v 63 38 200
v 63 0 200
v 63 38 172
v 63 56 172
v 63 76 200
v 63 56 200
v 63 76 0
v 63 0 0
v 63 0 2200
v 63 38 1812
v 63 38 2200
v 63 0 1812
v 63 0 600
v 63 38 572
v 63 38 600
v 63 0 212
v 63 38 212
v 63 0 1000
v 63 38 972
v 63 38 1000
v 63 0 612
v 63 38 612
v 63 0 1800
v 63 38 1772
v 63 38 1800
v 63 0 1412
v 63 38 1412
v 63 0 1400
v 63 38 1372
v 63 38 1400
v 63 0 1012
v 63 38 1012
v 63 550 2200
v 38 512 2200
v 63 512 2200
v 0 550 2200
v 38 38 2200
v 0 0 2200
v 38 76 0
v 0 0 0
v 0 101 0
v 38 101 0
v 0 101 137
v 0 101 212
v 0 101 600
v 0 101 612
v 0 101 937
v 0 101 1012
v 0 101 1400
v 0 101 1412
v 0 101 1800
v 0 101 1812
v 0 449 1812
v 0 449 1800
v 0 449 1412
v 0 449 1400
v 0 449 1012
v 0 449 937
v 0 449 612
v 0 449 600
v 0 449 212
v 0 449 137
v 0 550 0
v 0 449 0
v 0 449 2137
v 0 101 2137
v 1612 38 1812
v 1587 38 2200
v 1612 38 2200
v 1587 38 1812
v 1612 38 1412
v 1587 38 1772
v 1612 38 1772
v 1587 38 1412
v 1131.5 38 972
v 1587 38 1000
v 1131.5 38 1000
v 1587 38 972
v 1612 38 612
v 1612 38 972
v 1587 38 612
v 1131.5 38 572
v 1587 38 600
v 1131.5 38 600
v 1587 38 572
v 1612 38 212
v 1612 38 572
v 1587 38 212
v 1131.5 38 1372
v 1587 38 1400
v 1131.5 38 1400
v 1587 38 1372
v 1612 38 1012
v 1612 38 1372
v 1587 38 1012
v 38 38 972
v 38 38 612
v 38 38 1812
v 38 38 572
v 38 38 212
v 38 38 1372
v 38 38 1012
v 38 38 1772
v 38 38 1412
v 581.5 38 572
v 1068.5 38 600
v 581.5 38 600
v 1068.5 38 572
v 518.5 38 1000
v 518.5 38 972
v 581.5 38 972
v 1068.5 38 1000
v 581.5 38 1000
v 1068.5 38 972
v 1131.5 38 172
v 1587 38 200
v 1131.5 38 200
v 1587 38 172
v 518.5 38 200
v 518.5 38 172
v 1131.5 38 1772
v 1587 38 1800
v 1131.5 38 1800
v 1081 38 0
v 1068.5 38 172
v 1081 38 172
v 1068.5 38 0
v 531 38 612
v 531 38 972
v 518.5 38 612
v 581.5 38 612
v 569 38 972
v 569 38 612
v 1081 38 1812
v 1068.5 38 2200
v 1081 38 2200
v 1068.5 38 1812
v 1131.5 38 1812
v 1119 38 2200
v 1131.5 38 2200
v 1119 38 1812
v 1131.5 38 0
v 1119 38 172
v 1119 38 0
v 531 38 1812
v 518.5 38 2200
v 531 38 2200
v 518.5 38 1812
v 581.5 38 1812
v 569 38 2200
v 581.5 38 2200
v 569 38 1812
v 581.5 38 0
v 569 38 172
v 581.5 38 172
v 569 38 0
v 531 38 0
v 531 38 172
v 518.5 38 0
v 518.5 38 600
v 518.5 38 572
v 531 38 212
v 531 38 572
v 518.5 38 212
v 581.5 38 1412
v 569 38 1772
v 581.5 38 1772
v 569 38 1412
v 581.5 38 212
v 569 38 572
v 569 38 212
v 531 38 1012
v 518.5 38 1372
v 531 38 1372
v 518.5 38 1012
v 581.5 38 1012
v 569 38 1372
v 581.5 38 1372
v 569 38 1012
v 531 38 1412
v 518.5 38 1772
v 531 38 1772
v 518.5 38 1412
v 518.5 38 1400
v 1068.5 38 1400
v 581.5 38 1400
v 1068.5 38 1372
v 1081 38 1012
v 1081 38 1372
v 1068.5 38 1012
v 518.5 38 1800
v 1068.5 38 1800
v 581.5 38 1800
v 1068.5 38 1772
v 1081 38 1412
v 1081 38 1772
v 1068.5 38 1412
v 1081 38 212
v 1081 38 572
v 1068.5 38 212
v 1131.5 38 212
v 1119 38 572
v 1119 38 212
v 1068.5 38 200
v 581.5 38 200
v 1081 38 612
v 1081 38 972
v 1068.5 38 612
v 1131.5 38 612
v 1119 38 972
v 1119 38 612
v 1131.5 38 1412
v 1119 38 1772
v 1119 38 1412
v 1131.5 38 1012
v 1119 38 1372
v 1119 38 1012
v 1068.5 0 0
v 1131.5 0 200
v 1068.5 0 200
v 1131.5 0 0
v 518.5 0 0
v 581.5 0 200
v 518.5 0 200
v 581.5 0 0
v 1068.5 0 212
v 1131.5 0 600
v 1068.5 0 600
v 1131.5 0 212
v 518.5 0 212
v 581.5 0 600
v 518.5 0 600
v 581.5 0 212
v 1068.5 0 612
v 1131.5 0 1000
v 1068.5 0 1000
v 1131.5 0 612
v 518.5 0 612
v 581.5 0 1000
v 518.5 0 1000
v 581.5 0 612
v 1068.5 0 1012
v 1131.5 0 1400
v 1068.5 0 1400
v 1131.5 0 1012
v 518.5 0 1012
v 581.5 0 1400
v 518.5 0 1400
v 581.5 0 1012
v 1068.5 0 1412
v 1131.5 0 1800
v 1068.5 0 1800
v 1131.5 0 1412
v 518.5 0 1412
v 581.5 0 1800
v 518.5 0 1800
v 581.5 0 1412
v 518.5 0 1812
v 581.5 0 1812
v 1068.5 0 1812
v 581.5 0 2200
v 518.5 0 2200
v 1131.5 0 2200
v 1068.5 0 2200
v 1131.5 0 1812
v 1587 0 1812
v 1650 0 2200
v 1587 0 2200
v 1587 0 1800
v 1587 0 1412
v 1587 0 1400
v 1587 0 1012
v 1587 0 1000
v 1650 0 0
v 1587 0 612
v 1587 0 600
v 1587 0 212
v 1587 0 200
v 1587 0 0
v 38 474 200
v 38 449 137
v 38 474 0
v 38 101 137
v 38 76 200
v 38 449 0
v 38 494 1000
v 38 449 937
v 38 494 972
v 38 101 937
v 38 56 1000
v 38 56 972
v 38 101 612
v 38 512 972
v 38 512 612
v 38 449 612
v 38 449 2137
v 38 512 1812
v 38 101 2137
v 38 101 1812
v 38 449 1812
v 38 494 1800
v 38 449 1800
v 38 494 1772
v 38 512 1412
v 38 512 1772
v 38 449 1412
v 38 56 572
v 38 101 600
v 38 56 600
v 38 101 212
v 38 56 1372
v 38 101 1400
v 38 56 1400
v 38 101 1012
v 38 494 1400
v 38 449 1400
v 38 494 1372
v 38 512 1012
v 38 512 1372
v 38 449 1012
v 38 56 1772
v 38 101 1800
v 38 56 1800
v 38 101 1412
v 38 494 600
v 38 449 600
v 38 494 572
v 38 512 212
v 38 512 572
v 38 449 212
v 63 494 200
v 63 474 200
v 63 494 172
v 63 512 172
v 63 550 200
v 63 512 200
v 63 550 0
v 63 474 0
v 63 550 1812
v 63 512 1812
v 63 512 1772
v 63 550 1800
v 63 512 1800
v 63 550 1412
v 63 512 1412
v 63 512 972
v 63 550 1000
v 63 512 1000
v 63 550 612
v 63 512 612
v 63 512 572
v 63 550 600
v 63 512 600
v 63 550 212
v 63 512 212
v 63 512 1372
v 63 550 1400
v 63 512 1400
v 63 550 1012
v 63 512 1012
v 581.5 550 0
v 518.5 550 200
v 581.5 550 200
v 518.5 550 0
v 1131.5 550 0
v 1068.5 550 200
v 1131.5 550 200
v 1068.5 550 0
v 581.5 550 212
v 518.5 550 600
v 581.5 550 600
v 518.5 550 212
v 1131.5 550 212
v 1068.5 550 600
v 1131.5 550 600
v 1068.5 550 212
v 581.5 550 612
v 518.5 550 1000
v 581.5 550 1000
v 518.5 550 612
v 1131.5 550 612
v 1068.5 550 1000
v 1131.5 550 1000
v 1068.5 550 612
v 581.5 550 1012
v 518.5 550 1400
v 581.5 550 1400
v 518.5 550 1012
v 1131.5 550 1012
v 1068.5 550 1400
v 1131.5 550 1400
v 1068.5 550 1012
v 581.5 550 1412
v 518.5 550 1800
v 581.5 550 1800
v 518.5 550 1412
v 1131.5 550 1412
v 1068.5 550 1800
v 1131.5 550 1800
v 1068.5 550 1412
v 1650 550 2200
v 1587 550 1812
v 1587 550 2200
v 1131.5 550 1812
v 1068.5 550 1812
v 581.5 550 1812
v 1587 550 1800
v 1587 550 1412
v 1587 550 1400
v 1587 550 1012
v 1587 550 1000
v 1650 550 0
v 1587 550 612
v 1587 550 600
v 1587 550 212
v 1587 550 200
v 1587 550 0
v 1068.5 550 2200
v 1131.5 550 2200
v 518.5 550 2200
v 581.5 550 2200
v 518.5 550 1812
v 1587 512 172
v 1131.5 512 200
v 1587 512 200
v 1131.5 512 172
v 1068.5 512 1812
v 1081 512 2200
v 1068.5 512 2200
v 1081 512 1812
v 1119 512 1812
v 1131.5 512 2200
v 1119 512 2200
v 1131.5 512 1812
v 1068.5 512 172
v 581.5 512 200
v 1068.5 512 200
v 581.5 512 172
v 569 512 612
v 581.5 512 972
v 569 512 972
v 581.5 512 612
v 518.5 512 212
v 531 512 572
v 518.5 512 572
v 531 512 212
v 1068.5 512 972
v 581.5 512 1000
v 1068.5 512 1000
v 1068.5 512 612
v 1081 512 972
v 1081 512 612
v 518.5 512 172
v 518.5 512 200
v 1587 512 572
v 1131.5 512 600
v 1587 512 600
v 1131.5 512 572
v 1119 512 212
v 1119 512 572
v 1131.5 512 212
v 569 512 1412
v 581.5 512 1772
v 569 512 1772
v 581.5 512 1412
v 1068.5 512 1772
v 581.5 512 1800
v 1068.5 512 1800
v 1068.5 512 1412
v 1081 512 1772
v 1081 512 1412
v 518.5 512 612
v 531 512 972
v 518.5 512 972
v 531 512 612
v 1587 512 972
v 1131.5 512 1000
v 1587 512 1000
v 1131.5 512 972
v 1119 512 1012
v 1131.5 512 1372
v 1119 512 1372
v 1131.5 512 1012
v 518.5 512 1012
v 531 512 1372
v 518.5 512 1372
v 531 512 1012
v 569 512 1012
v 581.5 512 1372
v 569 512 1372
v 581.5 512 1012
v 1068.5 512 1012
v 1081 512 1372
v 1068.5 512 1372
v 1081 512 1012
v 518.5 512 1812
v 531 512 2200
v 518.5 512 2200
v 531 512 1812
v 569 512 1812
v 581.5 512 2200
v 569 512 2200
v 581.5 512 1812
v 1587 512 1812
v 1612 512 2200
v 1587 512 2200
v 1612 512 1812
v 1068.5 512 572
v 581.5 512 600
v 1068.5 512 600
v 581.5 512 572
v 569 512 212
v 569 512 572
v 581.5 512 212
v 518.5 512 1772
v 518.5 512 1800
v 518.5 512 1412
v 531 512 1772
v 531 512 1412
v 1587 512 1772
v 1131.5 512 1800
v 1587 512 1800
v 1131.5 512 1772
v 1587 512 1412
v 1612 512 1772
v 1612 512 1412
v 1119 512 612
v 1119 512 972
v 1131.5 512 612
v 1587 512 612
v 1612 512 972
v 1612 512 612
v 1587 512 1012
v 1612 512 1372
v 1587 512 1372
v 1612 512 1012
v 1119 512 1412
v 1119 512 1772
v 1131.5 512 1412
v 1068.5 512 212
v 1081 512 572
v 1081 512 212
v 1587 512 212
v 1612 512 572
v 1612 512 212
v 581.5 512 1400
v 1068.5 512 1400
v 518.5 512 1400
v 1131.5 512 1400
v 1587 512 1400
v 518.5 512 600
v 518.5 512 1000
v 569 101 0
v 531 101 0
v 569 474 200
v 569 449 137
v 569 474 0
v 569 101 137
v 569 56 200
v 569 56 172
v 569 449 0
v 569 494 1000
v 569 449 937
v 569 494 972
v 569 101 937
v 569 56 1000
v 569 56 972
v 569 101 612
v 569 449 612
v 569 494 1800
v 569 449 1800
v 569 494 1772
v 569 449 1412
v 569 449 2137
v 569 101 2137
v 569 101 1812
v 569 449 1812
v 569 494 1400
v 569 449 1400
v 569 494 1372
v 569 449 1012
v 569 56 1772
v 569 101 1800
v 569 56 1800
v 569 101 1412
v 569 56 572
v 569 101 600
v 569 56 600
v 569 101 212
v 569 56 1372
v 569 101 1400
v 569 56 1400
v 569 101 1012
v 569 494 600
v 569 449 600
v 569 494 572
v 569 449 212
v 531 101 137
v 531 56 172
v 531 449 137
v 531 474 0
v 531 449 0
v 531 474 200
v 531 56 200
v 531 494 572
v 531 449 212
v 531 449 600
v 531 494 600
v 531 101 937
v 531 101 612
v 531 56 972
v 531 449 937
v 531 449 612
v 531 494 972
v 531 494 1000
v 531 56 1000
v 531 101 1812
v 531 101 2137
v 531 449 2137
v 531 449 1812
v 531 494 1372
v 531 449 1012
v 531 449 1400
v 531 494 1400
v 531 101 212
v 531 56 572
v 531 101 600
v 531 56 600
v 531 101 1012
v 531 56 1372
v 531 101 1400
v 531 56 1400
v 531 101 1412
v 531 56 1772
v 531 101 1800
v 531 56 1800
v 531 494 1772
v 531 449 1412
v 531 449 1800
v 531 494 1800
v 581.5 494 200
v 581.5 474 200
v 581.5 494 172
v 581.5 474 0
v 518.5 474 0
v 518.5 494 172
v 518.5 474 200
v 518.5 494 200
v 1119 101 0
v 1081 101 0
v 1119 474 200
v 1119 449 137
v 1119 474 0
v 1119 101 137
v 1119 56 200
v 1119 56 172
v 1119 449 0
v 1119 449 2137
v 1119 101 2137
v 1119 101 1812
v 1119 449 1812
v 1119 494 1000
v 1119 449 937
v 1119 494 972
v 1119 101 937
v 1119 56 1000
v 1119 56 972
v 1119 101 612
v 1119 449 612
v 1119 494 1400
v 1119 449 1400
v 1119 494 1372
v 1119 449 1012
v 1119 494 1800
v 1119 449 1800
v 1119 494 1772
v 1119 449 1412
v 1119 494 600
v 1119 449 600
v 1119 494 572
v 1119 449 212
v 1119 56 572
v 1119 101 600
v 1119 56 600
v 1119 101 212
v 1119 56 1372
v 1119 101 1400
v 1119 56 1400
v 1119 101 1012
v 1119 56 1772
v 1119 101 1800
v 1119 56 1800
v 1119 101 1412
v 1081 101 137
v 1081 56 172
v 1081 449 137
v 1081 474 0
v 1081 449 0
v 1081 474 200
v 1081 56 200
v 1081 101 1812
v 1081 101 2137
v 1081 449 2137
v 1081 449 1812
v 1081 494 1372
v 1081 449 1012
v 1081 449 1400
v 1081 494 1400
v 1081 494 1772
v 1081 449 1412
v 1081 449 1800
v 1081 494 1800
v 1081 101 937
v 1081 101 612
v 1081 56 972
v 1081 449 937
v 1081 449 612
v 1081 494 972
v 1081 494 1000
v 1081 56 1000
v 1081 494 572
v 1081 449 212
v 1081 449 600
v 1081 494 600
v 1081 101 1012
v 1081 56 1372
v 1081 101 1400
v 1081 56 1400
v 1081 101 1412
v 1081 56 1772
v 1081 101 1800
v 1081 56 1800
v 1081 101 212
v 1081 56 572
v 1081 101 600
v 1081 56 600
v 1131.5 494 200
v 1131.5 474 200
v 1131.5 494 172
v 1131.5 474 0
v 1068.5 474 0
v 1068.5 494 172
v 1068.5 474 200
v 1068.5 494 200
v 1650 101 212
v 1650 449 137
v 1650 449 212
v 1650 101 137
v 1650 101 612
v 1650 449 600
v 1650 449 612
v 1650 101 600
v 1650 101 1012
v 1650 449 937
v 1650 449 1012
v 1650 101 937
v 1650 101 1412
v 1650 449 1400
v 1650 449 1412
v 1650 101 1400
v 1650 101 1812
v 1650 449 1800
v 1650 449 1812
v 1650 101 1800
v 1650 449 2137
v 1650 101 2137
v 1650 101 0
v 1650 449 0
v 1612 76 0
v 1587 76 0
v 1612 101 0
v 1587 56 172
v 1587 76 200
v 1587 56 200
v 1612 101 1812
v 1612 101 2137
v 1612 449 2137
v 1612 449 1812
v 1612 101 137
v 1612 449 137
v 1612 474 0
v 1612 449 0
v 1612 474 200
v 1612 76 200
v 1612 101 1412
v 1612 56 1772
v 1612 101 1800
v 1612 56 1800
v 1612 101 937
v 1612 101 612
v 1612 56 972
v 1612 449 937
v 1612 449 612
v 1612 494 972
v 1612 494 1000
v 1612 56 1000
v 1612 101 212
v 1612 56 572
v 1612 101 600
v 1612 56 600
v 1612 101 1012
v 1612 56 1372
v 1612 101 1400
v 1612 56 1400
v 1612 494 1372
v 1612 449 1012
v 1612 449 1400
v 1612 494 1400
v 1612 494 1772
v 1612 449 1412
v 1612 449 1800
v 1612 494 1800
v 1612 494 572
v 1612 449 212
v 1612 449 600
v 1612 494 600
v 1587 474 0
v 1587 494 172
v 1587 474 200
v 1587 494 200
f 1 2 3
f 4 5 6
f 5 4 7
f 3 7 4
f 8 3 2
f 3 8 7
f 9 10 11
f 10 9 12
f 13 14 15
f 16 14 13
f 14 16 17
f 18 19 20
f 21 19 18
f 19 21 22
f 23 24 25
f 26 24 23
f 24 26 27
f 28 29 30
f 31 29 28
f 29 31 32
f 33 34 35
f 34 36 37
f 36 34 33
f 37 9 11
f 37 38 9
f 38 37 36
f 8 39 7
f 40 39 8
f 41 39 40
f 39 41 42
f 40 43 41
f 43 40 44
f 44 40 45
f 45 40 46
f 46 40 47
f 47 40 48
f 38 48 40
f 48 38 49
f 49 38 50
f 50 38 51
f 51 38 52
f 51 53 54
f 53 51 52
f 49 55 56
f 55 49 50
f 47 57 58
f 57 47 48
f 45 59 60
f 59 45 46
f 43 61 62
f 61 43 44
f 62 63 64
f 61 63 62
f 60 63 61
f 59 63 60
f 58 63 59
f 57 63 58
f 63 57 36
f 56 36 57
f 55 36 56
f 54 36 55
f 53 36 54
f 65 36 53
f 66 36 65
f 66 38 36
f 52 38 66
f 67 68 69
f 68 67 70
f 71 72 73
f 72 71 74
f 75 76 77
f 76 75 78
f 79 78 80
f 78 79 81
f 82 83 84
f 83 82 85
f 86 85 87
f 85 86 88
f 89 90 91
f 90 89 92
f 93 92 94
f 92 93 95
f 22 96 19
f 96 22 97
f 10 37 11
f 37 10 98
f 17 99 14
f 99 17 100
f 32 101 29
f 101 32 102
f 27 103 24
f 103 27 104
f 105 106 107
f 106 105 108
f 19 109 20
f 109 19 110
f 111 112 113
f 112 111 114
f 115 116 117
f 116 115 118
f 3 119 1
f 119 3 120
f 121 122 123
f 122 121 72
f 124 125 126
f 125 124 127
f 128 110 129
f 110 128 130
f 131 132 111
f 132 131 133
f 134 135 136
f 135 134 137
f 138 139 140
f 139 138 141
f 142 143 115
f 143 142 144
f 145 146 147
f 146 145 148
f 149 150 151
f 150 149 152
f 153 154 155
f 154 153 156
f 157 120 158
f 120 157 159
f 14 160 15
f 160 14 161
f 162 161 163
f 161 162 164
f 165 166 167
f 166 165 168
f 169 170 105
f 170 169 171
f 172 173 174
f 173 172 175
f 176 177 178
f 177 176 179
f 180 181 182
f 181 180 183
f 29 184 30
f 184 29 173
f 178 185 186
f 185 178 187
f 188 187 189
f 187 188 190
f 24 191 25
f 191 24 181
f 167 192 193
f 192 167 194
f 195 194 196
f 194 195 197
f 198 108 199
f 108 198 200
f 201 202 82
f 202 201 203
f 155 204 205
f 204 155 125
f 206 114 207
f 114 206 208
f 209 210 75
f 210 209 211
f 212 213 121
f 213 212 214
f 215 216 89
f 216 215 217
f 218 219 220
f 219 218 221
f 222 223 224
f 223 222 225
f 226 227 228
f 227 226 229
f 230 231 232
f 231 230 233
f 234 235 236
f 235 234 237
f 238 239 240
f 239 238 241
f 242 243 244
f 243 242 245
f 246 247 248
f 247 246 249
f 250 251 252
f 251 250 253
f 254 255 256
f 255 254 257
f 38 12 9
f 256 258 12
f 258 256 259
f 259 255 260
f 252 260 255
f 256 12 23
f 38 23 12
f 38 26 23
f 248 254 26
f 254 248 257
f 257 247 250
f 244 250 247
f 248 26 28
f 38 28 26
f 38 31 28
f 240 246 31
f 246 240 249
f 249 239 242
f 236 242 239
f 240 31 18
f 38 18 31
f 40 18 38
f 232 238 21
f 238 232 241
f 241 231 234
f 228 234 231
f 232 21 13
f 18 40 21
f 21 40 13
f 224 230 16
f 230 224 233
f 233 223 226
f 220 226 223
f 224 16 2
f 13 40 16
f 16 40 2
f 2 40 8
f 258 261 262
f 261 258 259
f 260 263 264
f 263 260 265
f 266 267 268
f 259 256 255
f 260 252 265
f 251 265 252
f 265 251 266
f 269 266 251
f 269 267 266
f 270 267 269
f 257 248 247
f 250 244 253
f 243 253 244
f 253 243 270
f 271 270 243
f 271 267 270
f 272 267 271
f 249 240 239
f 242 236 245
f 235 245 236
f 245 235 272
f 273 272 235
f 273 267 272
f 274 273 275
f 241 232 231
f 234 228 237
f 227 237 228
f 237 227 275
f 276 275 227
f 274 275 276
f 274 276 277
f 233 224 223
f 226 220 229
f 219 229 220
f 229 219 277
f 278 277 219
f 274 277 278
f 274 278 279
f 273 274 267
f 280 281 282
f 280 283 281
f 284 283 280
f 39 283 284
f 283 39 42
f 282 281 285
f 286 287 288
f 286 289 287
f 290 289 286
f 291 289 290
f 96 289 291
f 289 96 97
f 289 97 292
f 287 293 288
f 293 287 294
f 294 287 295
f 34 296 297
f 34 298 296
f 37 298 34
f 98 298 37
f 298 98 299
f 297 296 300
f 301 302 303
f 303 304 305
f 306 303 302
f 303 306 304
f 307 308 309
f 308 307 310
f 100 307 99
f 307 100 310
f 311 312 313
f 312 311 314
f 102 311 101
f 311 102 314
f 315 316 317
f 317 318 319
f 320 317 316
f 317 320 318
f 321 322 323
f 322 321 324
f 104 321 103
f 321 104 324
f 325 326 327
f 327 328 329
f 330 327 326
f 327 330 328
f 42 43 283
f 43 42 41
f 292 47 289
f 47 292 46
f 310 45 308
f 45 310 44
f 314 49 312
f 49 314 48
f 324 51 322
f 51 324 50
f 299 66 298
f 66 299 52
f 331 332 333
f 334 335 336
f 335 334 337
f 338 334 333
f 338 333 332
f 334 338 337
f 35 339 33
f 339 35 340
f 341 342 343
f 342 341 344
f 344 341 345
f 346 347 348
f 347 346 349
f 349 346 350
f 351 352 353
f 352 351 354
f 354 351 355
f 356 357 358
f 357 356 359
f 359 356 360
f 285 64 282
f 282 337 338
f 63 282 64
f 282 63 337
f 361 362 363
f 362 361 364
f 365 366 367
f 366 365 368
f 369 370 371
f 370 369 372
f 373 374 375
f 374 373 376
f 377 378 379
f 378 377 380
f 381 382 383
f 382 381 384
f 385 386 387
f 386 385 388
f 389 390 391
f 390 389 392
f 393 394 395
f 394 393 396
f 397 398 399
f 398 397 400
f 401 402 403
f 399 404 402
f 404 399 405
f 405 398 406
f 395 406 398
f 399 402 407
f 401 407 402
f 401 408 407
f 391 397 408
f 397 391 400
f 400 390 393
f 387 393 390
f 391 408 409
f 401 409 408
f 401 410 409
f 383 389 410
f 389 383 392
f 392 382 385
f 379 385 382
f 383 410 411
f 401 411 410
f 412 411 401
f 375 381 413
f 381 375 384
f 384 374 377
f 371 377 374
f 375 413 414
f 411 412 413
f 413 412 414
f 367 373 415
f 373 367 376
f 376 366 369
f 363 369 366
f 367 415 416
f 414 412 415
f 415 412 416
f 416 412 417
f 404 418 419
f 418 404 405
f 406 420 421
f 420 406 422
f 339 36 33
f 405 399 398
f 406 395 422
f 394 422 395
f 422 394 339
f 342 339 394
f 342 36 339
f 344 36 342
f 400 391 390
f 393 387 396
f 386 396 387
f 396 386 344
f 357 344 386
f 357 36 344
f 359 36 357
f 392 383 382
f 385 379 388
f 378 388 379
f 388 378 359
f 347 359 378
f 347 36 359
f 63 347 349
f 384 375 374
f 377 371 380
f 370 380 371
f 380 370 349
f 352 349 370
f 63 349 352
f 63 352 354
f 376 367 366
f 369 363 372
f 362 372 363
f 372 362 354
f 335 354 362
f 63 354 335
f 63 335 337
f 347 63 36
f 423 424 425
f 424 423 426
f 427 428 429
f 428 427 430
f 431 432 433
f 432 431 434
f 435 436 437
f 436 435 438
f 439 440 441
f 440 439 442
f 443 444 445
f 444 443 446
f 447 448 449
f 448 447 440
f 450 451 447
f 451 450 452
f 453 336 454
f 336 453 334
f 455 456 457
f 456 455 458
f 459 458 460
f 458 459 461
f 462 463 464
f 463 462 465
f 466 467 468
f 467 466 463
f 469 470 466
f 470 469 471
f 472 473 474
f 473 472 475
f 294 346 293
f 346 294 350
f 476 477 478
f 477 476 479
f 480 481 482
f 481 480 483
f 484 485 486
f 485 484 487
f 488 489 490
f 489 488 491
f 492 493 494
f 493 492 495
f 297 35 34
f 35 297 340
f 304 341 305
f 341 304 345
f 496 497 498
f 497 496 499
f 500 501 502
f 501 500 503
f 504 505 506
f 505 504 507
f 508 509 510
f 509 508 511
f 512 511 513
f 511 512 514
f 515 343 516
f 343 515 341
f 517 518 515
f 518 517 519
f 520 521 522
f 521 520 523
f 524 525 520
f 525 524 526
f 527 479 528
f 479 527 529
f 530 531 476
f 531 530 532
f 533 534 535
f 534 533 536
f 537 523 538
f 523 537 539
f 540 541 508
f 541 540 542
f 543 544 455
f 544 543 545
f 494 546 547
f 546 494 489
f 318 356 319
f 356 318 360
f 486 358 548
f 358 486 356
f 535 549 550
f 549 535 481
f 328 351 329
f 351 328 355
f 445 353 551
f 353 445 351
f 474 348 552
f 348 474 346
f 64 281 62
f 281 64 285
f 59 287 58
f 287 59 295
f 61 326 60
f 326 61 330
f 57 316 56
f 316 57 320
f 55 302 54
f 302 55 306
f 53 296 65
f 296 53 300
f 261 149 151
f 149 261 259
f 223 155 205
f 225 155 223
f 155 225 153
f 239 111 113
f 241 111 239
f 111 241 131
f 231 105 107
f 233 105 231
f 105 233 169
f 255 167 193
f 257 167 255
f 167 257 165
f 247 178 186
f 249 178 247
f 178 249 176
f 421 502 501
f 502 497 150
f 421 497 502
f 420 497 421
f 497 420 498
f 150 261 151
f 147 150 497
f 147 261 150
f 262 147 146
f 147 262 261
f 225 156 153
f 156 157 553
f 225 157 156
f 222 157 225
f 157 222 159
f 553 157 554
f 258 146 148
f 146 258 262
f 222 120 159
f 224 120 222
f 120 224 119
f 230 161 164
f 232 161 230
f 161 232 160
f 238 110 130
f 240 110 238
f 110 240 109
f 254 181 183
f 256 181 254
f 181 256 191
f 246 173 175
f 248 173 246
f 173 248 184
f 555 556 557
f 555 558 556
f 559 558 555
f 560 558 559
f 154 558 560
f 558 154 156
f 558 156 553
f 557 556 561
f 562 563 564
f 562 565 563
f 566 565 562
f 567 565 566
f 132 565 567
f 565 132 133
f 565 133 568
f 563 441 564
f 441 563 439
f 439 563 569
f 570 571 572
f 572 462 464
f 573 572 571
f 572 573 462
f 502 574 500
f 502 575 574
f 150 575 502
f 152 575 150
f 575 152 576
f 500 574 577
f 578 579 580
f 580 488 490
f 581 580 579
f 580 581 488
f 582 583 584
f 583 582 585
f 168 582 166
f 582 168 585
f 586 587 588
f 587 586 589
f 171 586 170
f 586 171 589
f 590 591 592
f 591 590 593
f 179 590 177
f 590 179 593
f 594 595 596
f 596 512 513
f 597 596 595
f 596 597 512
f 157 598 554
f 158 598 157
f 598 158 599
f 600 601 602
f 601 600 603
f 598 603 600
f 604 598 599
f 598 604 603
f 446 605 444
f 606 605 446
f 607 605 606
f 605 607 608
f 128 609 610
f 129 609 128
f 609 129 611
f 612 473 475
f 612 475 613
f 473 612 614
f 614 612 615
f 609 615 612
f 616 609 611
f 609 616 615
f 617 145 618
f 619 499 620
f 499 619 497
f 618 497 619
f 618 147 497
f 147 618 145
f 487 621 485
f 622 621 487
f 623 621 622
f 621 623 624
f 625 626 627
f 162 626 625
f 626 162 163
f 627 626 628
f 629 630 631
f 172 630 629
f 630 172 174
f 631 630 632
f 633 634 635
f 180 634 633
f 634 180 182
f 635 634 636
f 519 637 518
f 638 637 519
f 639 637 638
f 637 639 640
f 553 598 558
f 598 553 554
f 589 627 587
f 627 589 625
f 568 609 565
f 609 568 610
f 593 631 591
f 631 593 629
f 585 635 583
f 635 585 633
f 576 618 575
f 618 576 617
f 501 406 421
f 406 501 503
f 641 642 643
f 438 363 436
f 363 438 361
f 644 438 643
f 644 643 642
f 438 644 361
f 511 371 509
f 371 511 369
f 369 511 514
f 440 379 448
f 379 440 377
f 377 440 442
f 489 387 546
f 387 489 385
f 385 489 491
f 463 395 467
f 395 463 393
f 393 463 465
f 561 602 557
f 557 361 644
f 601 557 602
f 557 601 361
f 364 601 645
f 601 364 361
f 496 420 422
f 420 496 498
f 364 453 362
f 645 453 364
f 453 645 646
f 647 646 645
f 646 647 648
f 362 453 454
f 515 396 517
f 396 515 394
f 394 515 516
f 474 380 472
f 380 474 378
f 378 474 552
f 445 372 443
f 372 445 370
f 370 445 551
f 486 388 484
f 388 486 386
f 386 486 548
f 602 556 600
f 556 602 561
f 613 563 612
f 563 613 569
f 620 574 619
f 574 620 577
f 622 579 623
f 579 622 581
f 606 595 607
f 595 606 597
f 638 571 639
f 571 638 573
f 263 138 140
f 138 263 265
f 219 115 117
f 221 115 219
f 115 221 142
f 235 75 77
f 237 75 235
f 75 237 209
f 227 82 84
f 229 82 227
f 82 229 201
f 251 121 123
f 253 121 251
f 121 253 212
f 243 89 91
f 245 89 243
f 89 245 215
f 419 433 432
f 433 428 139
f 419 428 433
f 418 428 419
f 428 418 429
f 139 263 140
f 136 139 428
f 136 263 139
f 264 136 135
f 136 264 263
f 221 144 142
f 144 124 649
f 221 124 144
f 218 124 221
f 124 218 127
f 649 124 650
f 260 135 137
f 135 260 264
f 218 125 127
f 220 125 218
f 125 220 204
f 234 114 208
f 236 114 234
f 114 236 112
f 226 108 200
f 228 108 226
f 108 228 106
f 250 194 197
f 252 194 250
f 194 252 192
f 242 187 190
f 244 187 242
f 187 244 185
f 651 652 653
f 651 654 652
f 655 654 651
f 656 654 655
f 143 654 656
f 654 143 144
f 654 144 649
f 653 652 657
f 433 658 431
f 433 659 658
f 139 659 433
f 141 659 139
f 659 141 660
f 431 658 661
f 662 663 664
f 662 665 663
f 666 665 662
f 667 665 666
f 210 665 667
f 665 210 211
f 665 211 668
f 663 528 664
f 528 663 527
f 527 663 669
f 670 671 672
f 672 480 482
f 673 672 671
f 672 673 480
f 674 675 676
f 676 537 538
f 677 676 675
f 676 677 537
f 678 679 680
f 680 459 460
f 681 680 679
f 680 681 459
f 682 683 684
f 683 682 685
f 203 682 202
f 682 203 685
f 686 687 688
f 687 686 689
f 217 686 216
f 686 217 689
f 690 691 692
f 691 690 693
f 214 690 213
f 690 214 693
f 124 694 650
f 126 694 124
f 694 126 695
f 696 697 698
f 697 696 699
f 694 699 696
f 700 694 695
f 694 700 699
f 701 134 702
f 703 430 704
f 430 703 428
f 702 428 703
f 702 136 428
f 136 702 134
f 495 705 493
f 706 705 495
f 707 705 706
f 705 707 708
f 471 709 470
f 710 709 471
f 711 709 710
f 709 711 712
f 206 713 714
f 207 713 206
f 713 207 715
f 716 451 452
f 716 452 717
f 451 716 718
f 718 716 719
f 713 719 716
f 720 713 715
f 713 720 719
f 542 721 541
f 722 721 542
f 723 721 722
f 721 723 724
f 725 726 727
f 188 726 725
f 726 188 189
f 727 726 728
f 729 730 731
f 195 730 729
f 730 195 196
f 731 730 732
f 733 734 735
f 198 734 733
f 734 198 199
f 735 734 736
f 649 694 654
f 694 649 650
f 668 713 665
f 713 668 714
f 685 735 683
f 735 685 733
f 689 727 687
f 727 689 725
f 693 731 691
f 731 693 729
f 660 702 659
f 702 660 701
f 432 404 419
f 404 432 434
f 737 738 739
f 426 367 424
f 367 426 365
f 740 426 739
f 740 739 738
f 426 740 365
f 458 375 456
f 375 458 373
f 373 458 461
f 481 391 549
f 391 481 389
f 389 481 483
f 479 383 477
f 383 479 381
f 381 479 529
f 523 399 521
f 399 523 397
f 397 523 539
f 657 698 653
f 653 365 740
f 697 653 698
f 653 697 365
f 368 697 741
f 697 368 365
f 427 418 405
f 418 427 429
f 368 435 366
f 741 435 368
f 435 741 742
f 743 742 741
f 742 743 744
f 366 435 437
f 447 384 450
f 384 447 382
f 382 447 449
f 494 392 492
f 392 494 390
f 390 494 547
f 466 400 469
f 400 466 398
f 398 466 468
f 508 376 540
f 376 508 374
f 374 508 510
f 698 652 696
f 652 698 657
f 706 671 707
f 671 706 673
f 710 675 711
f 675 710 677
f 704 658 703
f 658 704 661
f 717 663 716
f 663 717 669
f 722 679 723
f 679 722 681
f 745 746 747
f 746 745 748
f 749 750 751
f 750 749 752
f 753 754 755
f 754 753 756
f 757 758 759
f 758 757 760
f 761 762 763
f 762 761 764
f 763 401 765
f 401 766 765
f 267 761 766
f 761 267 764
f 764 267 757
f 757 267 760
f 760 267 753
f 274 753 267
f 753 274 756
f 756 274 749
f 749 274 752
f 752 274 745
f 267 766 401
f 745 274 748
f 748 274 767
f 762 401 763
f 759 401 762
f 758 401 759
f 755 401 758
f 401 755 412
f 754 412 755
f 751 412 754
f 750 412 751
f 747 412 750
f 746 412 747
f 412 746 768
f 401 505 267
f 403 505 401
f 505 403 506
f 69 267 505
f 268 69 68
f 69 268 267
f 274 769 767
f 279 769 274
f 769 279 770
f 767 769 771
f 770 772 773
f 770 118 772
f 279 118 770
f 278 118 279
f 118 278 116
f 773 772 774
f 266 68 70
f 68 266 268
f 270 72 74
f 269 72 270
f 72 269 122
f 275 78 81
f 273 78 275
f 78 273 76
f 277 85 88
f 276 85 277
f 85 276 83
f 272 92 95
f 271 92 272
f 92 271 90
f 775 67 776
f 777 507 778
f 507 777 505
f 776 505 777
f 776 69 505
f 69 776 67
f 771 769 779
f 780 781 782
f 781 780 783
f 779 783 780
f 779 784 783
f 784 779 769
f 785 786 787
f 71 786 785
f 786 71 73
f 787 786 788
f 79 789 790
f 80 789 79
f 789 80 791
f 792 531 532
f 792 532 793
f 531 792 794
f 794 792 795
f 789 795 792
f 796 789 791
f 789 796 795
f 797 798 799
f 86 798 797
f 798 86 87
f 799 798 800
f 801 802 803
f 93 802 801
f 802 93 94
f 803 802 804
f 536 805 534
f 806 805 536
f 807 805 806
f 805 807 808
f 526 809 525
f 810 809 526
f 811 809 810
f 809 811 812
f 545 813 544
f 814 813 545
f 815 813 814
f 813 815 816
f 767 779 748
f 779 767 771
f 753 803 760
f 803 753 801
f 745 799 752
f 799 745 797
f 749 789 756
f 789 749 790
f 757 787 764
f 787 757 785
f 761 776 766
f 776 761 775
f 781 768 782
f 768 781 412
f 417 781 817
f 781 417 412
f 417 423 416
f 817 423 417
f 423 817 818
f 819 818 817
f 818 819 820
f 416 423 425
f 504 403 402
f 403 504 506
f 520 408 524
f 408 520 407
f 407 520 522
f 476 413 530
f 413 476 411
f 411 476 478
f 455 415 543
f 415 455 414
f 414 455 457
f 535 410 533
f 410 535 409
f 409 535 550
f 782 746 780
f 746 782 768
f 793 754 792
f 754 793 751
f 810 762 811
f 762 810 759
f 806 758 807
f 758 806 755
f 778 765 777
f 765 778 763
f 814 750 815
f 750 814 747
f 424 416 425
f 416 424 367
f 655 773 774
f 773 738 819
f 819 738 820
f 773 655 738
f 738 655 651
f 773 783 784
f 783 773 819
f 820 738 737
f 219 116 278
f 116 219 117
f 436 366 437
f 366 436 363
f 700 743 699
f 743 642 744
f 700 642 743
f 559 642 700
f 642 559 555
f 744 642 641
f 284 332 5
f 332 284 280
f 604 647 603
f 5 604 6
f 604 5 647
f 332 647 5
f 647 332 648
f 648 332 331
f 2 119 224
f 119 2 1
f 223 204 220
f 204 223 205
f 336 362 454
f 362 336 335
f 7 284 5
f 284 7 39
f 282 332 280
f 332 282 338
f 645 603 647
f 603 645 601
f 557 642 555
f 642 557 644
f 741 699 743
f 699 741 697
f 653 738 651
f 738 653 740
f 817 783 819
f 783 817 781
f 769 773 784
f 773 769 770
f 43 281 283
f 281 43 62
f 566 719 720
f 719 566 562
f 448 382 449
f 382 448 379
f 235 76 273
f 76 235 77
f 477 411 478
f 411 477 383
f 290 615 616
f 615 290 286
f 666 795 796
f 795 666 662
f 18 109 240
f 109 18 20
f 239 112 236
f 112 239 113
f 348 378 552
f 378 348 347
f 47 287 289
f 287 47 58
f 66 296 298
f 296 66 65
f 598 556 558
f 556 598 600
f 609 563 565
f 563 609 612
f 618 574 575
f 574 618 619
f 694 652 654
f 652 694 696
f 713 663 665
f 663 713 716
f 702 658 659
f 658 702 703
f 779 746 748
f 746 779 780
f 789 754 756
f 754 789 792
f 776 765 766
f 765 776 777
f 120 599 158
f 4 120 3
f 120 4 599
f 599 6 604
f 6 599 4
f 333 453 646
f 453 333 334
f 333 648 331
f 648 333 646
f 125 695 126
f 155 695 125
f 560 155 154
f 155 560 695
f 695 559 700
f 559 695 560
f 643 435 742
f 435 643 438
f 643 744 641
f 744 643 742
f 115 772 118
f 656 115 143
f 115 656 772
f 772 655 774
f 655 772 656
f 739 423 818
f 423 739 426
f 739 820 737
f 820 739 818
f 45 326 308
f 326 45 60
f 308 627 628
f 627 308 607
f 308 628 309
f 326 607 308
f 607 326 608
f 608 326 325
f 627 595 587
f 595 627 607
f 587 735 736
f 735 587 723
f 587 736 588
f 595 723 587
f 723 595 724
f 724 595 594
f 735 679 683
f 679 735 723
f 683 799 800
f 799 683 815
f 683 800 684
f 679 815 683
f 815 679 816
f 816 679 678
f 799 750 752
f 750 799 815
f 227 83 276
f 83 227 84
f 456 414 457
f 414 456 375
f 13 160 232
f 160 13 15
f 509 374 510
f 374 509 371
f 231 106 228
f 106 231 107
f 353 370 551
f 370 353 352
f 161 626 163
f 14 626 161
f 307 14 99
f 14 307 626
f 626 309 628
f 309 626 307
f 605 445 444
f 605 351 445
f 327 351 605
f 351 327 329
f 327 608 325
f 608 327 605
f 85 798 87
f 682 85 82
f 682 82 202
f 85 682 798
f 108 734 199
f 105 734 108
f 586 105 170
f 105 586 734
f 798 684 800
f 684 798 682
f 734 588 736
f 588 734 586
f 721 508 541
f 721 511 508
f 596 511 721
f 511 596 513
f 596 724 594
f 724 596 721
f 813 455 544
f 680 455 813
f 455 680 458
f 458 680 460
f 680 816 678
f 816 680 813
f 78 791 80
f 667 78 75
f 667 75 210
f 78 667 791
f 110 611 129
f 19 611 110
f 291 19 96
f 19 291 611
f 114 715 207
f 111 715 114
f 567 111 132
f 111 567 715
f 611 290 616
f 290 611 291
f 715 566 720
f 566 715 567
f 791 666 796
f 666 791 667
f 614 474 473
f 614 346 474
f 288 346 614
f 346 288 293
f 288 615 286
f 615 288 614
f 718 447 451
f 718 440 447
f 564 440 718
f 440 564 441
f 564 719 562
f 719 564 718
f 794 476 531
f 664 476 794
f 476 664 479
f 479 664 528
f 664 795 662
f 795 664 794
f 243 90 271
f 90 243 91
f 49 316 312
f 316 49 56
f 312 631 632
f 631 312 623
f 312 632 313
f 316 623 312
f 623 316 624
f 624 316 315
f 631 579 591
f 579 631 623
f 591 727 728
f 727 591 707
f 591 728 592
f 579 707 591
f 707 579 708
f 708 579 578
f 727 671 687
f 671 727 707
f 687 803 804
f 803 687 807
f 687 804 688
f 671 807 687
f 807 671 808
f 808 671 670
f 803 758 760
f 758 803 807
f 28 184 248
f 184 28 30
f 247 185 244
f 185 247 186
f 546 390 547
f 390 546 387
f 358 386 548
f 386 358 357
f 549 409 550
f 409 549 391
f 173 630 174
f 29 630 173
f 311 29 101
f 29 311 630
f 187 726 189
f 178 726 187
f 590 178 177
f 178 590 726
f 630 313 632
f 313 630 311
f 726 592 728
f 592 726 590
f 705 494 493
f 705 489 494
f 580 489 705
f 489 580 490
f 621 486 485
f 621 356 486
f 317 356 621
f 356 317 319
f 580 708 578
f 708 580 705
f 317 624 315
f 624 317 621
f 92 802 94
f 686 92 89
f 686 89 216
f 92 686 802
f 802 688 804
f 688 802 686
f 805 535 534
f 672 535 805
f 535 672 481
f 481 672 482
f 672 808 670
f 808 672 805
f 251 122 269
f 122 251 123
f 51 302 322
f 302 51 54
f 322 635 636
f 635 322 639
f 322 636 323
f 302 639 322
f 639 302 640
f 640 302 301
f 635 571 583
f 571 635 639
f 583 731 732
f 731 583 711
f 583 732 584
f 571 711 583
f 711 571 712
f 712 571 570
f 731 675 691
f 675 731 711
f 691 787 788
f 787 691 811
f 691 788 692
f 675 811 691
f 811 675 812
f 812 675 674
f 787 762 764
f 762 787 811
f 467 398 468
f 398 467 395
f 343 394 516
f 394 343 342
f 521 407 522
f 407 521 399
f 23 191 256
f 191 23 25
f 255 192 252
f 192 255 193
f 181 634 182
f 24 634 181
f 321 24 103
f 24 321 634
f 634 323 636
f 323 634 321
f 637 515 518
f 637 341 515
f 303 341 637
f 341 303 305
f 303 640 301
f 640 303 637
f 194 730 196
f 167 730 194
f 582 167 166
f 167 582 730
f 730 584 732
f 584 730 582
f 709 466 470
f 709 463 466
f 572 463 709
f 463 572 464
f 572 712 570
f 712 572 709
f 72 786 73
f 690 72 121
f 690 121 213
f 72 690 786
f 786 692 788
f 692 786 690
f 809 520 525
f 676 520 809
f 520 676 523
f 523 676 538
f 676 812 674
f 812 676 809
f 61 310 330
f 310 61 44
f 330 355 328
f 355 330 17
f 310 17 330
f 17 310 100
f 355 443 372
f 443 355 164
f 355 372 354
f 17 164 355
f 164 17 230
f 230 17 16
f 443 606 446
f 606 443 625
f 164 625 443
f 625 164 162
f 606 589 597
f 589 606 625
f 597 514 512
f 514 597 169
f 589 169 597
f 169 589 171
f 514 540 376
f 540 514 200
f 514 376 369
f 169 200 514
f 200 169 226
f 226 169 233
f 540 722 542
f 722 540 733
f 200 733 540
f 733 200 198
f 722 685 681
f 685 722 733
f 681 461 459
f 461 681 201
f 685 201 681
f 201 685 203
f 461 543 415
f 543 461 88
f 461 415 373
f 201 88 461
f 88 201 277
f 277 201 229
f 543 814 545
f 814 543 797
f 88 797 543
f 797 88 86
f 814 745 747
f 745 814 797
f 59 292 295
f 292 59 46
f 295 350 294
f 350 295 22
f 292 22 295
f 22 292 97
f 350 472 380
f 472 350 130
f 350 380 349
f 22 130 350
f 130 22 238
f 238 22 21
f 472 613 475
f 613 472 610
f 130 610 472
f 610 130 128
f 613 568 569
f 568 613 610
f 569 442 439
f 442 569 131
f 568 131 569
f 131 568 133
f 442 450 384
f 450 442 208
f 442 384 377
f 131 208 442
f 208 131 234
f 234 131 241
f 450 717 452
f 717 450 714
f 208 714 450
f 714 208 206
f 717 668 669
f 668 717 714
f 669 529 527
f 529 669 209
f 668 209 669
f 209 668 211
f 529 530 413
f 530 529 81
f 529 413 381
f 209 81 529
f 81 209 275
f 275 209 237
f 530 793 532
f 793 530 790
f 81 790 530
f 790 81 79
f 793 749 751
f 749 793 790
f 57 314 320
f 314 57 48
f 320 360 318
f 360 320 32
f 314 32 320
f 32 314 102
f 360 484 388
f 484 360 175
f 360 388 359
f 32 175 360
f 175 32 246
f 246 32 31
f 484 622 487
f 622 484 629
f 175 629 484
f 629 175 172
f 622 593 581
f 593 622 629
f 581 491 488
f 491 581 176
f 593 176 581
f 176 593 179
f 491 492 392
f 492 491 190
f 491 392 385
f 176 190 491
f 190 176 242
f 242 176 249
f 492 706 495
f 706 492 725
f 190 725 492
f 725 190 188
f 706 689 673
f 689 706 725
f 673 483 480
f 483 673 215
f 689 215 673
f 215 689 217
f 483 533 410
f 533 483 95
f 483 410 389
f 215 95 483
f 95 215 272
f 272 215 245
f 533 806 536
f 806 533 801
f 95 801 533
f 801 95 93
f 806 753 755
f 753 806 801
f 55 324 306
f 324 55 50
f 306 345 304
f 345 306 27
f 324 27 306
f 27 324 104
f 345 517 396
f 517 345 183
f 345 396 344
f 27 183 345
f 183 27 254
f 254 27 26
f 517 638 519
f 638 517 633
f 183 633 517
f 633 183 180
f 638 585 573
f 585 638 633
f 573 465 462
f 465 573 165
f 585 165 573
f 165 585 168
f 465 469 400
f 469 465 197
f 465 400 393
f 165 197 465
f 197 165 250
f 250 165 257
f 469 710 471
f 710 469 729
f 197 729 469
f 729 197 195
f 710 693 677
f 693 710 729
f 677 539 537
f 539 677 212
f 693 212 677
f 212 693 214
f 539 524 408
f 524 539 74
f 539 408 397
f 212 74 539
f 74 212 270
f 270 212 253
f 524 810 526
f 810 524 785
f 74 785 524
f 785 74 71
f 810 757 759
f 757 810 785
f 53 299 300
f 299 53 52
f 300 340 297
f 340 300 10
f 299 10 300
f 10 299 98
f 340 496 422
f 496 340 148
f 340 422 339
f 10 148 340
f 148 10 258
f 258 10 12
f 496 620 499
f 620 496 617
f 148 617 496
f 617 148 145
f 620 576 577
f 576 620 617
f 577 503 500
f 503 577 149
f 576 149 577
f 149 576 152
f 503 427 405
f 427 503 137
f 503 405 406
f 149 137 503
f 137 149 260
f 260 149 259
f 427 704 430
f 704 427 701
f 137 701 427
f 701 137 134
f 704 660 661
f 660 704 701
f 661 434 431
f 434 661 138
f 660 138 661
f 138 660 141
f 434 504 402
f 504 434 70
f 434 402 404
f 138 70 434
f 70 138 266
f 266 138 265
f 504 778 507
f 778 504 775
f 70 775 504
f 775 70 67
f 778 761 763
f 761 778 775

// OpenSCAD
/**
 * Width  = 1650mm
 * Height = 2250mm
 * Depth  =  550mm
 *
 * |-----------------------------------------------------------------|
 * |^^^^^^^^^^^^^^^^^^^^^^^^^^^^^^^^^^^^^^^^^^^^^^^^^^^^^^^^^^^^^^^^^|
 * | Question: should I reinforce the base in contact with the skirt |
 * | by layering boards or should I reduce the size to simplify      |
 * | the design and avoid the skirts entirely ?                      |
 * |_________________________________________________________________|
 * |=================================================================|
 *
 * Build instructions:
 * - Note the reinforced feet to allow cutoff for the room skirts
 * - Consider cutting short the central pillar to allow max usage
 *   of top space
 *
 * Assembly instructions:
 * - Wrap the feets to protect the woods, this thing is heavy
 * - Put padding on the ground, like a carpet or maybe hardboard
 *   to help absorb the compression
 * - Use saw horse and workbenches to screw in the shelves supports
 * - Assemble in order
 *  0. Vertial structure
 *  1. Lateral truss
 *  2. Shelves positioning
 *  3. Shelves support - more or less here it should be finished or painted
 *  4. Put in place
 */

$fn=60;

// Vertical Structure
// Joined with self aligning joint:
// - see https://www.youtube.com/watch?v=R1ZirrwzNtk&list=LL
translate([0,         0,         0]) cube([63, 38, 2200], false);
translate([0,         38,        0]) cube([38, 63, 2200], false);
translate([0,         550-38,    0]) cube([63, 38, 2200], false);
translate([0,         550-63-38, 0]) cube([38, 63, 2200], false);
translate([550-63/2,  0,         0]) cube([63, 38, 2200], false);
translate([550-38/2,  38,        0]) cube([38, 63, 2200], false);
translate([550-63/2,  550-38,    0]) cube([63, 38, 2200], false);
translate([550-38/2,  550-63-38, 0]) cube([38, 63, 2200], false);
translate([1100-63/2, 0,         0]) cube([63, 38, 2200], false);
translate([1100-38/2, 38,        0]) cube([38, 63, 2200], false);
translate([1100-63/2, 550-38,    0]) cube([63, 38, 2200], false);
translate([1100-38/2, 550-63-38, 0]) cube([38, 63, 2200], false);
translate([1650-63,   0,         0]) cube([63, 38, 2200], false);
translate([1650-38,   38,        0]) cube([38, 63, 2200], false);
translate([1650-63,   550-38,    0]) cube([63, 38, 2200], false);
translate([1650-38,   550-38-63, 0]) cube([38, 63, 2200], false);

// Feet reinforcement
translate([0,         38,        0]) cube([63, 38, 200], false);
translate([0,         550-38*2,  0]) cube([63, 38, 200], false);
translate([550-63/2,  550-38*2,  0]) cube([63, 38, 200], false);
translate([1100-63/2, 550-38*2,  0]) cube([63, 38, 200], false);
translate([1650-63,   550-38*2,  0]) cube([63, 38, 200], false);
translate([1650-63,   38,        0]) cube([63, 38, 200], false);

// Lateral Truss
// Joined with
translate([0,         0, 200-63])  cube([38, 550, 63], false);
translate([0,         0, 1000-63]) cube([38, 550, 63], false);
translate([0,         0, 2200-63]) cube([38, 550, 63], false);
translate([550-38/2,  0, 200-63])  cube([38, 550, 63], false);
translate([550-38/2,  0, 1000-63]) cube([38, 550, 63], false);
translate([550-38/2,  0, 2200-63]) cube([38, 550, 63], false);
translate([1100-38/2, 0, 200-63])  cube([38, 550, 63], false);
translate([1100-38/2, 0, 1000-63]) cube([38, 550, 63], false);
translate([1100-38/2, 0, 2200-63]) cube([38, 550, 63], false);
translate([1650-38,   0, 200-63])  cube([38, 550, 63], false);
translate([1650-38,   0, 1000-63]) cube([38, 550, 63], false);
translate([1650-38,   0, 2200-63]) cube([38, 550, 63], false);


// Shelves Support
// Screwed in lastly!
// ??? Can I use dis-assembleable fasteners?!
// - like T-Nut ?
translate([0,    38,        200-28])  cube([550, 18, 28], false);
translate([0,    550-18-38, 200-28])  cube([550, 18, 28], false);
translate([550,  38,        200-28])  cube([550, 18, 28], false);
translate([550,  550-18-38, 200-28])  cube([550, 18, 28], false);
translate([1100, 38,        200-28])  cube([550, 18, 28], false);
translate([1100, 550-18-38, 200-28])  cube([550, 18, 28], false);
translate([0,    38,        600-28])  cube([550, 18, 28], false);
translate([0,    550-18-38, 600-28])  cube([550, 18, 28], false);
translate([550,  38,        600-28])  cube([550, 18, 28], false);
translate([550,  550-18-38, 600-28])  cube([550, 18, 28], false);
translate([1100, 38,        600-28])  cube([550, 18, 28], false);
translate([1100, 550-18-38, 600-28])  cube([550, 18, 28], false);
translate([0,    38,        1000-28]) cube([550, 18, 28], false);
translate([0,    550-18-38, 1000-28]) cube([550, 18, 28], false);
translate([550,  38,        1000-28]) cube([550, 18, 28], false);
translate([550,  550-18-38, 1000-28]) cube([550, 18, 28], false);
translate([1100, 38,        1000-28]) cube([550, 18, 28], false);
translate([1100, 550-18-38, 1000-28]) cube([550, 18, 28], false);
translate([0,    38,        1400-28]) cube([550, 18, 28], false);
translate([0,    550-18-38, 1400-28]) cube([550, 18, 28], false);
translate([550,  38,        1400-28]) cube([550, 18, 28], false);
translate([550,  550-18-38, 1400-28]) cube([550, 18, 28], false);
translate([1100, 38,        1400-28]) cube([550, 18, 28], false);
translate([1100, 550-18-38, 1400-28]) cube([550, 18, 28], false);
translate([0,    38,        1800-28]) cube([550, 18, 28], false);
translate([0,    550-18-38, 1800-28]) cube([550, 18, 28], false);
translate([550,  38,        1800-28]) cube([550, 18, 28], false);
translate([550,  550-18-38, 1800-28]) cube([550, 18, 28], false);
translate([1100, 38,        1800-28]) cube([550, 18, 28], false);
translate([1100, 550-18-38, 1800-28]) cube([550, 18, 28], false);

// Shelves
/*
Should regulate height to account for:
- Bottom padding
- Room skirts
- Putting shelves on the negative instead of positive like here?
- Leaving enough space at the top for monitors height?
*/
translate([0, 0, 200])  cube([1650, 550, 12], false);
translate([0, 0, 600])  cube([1650, 550, 12], false);
translate([0, 0, 1000]) cube([1650, 550, 12], false);
translate([0, 0, 1400]) cube([1650, 550, 12], false);
translate([0, 0, 1800]) cube([1650, 550, 12], false);
